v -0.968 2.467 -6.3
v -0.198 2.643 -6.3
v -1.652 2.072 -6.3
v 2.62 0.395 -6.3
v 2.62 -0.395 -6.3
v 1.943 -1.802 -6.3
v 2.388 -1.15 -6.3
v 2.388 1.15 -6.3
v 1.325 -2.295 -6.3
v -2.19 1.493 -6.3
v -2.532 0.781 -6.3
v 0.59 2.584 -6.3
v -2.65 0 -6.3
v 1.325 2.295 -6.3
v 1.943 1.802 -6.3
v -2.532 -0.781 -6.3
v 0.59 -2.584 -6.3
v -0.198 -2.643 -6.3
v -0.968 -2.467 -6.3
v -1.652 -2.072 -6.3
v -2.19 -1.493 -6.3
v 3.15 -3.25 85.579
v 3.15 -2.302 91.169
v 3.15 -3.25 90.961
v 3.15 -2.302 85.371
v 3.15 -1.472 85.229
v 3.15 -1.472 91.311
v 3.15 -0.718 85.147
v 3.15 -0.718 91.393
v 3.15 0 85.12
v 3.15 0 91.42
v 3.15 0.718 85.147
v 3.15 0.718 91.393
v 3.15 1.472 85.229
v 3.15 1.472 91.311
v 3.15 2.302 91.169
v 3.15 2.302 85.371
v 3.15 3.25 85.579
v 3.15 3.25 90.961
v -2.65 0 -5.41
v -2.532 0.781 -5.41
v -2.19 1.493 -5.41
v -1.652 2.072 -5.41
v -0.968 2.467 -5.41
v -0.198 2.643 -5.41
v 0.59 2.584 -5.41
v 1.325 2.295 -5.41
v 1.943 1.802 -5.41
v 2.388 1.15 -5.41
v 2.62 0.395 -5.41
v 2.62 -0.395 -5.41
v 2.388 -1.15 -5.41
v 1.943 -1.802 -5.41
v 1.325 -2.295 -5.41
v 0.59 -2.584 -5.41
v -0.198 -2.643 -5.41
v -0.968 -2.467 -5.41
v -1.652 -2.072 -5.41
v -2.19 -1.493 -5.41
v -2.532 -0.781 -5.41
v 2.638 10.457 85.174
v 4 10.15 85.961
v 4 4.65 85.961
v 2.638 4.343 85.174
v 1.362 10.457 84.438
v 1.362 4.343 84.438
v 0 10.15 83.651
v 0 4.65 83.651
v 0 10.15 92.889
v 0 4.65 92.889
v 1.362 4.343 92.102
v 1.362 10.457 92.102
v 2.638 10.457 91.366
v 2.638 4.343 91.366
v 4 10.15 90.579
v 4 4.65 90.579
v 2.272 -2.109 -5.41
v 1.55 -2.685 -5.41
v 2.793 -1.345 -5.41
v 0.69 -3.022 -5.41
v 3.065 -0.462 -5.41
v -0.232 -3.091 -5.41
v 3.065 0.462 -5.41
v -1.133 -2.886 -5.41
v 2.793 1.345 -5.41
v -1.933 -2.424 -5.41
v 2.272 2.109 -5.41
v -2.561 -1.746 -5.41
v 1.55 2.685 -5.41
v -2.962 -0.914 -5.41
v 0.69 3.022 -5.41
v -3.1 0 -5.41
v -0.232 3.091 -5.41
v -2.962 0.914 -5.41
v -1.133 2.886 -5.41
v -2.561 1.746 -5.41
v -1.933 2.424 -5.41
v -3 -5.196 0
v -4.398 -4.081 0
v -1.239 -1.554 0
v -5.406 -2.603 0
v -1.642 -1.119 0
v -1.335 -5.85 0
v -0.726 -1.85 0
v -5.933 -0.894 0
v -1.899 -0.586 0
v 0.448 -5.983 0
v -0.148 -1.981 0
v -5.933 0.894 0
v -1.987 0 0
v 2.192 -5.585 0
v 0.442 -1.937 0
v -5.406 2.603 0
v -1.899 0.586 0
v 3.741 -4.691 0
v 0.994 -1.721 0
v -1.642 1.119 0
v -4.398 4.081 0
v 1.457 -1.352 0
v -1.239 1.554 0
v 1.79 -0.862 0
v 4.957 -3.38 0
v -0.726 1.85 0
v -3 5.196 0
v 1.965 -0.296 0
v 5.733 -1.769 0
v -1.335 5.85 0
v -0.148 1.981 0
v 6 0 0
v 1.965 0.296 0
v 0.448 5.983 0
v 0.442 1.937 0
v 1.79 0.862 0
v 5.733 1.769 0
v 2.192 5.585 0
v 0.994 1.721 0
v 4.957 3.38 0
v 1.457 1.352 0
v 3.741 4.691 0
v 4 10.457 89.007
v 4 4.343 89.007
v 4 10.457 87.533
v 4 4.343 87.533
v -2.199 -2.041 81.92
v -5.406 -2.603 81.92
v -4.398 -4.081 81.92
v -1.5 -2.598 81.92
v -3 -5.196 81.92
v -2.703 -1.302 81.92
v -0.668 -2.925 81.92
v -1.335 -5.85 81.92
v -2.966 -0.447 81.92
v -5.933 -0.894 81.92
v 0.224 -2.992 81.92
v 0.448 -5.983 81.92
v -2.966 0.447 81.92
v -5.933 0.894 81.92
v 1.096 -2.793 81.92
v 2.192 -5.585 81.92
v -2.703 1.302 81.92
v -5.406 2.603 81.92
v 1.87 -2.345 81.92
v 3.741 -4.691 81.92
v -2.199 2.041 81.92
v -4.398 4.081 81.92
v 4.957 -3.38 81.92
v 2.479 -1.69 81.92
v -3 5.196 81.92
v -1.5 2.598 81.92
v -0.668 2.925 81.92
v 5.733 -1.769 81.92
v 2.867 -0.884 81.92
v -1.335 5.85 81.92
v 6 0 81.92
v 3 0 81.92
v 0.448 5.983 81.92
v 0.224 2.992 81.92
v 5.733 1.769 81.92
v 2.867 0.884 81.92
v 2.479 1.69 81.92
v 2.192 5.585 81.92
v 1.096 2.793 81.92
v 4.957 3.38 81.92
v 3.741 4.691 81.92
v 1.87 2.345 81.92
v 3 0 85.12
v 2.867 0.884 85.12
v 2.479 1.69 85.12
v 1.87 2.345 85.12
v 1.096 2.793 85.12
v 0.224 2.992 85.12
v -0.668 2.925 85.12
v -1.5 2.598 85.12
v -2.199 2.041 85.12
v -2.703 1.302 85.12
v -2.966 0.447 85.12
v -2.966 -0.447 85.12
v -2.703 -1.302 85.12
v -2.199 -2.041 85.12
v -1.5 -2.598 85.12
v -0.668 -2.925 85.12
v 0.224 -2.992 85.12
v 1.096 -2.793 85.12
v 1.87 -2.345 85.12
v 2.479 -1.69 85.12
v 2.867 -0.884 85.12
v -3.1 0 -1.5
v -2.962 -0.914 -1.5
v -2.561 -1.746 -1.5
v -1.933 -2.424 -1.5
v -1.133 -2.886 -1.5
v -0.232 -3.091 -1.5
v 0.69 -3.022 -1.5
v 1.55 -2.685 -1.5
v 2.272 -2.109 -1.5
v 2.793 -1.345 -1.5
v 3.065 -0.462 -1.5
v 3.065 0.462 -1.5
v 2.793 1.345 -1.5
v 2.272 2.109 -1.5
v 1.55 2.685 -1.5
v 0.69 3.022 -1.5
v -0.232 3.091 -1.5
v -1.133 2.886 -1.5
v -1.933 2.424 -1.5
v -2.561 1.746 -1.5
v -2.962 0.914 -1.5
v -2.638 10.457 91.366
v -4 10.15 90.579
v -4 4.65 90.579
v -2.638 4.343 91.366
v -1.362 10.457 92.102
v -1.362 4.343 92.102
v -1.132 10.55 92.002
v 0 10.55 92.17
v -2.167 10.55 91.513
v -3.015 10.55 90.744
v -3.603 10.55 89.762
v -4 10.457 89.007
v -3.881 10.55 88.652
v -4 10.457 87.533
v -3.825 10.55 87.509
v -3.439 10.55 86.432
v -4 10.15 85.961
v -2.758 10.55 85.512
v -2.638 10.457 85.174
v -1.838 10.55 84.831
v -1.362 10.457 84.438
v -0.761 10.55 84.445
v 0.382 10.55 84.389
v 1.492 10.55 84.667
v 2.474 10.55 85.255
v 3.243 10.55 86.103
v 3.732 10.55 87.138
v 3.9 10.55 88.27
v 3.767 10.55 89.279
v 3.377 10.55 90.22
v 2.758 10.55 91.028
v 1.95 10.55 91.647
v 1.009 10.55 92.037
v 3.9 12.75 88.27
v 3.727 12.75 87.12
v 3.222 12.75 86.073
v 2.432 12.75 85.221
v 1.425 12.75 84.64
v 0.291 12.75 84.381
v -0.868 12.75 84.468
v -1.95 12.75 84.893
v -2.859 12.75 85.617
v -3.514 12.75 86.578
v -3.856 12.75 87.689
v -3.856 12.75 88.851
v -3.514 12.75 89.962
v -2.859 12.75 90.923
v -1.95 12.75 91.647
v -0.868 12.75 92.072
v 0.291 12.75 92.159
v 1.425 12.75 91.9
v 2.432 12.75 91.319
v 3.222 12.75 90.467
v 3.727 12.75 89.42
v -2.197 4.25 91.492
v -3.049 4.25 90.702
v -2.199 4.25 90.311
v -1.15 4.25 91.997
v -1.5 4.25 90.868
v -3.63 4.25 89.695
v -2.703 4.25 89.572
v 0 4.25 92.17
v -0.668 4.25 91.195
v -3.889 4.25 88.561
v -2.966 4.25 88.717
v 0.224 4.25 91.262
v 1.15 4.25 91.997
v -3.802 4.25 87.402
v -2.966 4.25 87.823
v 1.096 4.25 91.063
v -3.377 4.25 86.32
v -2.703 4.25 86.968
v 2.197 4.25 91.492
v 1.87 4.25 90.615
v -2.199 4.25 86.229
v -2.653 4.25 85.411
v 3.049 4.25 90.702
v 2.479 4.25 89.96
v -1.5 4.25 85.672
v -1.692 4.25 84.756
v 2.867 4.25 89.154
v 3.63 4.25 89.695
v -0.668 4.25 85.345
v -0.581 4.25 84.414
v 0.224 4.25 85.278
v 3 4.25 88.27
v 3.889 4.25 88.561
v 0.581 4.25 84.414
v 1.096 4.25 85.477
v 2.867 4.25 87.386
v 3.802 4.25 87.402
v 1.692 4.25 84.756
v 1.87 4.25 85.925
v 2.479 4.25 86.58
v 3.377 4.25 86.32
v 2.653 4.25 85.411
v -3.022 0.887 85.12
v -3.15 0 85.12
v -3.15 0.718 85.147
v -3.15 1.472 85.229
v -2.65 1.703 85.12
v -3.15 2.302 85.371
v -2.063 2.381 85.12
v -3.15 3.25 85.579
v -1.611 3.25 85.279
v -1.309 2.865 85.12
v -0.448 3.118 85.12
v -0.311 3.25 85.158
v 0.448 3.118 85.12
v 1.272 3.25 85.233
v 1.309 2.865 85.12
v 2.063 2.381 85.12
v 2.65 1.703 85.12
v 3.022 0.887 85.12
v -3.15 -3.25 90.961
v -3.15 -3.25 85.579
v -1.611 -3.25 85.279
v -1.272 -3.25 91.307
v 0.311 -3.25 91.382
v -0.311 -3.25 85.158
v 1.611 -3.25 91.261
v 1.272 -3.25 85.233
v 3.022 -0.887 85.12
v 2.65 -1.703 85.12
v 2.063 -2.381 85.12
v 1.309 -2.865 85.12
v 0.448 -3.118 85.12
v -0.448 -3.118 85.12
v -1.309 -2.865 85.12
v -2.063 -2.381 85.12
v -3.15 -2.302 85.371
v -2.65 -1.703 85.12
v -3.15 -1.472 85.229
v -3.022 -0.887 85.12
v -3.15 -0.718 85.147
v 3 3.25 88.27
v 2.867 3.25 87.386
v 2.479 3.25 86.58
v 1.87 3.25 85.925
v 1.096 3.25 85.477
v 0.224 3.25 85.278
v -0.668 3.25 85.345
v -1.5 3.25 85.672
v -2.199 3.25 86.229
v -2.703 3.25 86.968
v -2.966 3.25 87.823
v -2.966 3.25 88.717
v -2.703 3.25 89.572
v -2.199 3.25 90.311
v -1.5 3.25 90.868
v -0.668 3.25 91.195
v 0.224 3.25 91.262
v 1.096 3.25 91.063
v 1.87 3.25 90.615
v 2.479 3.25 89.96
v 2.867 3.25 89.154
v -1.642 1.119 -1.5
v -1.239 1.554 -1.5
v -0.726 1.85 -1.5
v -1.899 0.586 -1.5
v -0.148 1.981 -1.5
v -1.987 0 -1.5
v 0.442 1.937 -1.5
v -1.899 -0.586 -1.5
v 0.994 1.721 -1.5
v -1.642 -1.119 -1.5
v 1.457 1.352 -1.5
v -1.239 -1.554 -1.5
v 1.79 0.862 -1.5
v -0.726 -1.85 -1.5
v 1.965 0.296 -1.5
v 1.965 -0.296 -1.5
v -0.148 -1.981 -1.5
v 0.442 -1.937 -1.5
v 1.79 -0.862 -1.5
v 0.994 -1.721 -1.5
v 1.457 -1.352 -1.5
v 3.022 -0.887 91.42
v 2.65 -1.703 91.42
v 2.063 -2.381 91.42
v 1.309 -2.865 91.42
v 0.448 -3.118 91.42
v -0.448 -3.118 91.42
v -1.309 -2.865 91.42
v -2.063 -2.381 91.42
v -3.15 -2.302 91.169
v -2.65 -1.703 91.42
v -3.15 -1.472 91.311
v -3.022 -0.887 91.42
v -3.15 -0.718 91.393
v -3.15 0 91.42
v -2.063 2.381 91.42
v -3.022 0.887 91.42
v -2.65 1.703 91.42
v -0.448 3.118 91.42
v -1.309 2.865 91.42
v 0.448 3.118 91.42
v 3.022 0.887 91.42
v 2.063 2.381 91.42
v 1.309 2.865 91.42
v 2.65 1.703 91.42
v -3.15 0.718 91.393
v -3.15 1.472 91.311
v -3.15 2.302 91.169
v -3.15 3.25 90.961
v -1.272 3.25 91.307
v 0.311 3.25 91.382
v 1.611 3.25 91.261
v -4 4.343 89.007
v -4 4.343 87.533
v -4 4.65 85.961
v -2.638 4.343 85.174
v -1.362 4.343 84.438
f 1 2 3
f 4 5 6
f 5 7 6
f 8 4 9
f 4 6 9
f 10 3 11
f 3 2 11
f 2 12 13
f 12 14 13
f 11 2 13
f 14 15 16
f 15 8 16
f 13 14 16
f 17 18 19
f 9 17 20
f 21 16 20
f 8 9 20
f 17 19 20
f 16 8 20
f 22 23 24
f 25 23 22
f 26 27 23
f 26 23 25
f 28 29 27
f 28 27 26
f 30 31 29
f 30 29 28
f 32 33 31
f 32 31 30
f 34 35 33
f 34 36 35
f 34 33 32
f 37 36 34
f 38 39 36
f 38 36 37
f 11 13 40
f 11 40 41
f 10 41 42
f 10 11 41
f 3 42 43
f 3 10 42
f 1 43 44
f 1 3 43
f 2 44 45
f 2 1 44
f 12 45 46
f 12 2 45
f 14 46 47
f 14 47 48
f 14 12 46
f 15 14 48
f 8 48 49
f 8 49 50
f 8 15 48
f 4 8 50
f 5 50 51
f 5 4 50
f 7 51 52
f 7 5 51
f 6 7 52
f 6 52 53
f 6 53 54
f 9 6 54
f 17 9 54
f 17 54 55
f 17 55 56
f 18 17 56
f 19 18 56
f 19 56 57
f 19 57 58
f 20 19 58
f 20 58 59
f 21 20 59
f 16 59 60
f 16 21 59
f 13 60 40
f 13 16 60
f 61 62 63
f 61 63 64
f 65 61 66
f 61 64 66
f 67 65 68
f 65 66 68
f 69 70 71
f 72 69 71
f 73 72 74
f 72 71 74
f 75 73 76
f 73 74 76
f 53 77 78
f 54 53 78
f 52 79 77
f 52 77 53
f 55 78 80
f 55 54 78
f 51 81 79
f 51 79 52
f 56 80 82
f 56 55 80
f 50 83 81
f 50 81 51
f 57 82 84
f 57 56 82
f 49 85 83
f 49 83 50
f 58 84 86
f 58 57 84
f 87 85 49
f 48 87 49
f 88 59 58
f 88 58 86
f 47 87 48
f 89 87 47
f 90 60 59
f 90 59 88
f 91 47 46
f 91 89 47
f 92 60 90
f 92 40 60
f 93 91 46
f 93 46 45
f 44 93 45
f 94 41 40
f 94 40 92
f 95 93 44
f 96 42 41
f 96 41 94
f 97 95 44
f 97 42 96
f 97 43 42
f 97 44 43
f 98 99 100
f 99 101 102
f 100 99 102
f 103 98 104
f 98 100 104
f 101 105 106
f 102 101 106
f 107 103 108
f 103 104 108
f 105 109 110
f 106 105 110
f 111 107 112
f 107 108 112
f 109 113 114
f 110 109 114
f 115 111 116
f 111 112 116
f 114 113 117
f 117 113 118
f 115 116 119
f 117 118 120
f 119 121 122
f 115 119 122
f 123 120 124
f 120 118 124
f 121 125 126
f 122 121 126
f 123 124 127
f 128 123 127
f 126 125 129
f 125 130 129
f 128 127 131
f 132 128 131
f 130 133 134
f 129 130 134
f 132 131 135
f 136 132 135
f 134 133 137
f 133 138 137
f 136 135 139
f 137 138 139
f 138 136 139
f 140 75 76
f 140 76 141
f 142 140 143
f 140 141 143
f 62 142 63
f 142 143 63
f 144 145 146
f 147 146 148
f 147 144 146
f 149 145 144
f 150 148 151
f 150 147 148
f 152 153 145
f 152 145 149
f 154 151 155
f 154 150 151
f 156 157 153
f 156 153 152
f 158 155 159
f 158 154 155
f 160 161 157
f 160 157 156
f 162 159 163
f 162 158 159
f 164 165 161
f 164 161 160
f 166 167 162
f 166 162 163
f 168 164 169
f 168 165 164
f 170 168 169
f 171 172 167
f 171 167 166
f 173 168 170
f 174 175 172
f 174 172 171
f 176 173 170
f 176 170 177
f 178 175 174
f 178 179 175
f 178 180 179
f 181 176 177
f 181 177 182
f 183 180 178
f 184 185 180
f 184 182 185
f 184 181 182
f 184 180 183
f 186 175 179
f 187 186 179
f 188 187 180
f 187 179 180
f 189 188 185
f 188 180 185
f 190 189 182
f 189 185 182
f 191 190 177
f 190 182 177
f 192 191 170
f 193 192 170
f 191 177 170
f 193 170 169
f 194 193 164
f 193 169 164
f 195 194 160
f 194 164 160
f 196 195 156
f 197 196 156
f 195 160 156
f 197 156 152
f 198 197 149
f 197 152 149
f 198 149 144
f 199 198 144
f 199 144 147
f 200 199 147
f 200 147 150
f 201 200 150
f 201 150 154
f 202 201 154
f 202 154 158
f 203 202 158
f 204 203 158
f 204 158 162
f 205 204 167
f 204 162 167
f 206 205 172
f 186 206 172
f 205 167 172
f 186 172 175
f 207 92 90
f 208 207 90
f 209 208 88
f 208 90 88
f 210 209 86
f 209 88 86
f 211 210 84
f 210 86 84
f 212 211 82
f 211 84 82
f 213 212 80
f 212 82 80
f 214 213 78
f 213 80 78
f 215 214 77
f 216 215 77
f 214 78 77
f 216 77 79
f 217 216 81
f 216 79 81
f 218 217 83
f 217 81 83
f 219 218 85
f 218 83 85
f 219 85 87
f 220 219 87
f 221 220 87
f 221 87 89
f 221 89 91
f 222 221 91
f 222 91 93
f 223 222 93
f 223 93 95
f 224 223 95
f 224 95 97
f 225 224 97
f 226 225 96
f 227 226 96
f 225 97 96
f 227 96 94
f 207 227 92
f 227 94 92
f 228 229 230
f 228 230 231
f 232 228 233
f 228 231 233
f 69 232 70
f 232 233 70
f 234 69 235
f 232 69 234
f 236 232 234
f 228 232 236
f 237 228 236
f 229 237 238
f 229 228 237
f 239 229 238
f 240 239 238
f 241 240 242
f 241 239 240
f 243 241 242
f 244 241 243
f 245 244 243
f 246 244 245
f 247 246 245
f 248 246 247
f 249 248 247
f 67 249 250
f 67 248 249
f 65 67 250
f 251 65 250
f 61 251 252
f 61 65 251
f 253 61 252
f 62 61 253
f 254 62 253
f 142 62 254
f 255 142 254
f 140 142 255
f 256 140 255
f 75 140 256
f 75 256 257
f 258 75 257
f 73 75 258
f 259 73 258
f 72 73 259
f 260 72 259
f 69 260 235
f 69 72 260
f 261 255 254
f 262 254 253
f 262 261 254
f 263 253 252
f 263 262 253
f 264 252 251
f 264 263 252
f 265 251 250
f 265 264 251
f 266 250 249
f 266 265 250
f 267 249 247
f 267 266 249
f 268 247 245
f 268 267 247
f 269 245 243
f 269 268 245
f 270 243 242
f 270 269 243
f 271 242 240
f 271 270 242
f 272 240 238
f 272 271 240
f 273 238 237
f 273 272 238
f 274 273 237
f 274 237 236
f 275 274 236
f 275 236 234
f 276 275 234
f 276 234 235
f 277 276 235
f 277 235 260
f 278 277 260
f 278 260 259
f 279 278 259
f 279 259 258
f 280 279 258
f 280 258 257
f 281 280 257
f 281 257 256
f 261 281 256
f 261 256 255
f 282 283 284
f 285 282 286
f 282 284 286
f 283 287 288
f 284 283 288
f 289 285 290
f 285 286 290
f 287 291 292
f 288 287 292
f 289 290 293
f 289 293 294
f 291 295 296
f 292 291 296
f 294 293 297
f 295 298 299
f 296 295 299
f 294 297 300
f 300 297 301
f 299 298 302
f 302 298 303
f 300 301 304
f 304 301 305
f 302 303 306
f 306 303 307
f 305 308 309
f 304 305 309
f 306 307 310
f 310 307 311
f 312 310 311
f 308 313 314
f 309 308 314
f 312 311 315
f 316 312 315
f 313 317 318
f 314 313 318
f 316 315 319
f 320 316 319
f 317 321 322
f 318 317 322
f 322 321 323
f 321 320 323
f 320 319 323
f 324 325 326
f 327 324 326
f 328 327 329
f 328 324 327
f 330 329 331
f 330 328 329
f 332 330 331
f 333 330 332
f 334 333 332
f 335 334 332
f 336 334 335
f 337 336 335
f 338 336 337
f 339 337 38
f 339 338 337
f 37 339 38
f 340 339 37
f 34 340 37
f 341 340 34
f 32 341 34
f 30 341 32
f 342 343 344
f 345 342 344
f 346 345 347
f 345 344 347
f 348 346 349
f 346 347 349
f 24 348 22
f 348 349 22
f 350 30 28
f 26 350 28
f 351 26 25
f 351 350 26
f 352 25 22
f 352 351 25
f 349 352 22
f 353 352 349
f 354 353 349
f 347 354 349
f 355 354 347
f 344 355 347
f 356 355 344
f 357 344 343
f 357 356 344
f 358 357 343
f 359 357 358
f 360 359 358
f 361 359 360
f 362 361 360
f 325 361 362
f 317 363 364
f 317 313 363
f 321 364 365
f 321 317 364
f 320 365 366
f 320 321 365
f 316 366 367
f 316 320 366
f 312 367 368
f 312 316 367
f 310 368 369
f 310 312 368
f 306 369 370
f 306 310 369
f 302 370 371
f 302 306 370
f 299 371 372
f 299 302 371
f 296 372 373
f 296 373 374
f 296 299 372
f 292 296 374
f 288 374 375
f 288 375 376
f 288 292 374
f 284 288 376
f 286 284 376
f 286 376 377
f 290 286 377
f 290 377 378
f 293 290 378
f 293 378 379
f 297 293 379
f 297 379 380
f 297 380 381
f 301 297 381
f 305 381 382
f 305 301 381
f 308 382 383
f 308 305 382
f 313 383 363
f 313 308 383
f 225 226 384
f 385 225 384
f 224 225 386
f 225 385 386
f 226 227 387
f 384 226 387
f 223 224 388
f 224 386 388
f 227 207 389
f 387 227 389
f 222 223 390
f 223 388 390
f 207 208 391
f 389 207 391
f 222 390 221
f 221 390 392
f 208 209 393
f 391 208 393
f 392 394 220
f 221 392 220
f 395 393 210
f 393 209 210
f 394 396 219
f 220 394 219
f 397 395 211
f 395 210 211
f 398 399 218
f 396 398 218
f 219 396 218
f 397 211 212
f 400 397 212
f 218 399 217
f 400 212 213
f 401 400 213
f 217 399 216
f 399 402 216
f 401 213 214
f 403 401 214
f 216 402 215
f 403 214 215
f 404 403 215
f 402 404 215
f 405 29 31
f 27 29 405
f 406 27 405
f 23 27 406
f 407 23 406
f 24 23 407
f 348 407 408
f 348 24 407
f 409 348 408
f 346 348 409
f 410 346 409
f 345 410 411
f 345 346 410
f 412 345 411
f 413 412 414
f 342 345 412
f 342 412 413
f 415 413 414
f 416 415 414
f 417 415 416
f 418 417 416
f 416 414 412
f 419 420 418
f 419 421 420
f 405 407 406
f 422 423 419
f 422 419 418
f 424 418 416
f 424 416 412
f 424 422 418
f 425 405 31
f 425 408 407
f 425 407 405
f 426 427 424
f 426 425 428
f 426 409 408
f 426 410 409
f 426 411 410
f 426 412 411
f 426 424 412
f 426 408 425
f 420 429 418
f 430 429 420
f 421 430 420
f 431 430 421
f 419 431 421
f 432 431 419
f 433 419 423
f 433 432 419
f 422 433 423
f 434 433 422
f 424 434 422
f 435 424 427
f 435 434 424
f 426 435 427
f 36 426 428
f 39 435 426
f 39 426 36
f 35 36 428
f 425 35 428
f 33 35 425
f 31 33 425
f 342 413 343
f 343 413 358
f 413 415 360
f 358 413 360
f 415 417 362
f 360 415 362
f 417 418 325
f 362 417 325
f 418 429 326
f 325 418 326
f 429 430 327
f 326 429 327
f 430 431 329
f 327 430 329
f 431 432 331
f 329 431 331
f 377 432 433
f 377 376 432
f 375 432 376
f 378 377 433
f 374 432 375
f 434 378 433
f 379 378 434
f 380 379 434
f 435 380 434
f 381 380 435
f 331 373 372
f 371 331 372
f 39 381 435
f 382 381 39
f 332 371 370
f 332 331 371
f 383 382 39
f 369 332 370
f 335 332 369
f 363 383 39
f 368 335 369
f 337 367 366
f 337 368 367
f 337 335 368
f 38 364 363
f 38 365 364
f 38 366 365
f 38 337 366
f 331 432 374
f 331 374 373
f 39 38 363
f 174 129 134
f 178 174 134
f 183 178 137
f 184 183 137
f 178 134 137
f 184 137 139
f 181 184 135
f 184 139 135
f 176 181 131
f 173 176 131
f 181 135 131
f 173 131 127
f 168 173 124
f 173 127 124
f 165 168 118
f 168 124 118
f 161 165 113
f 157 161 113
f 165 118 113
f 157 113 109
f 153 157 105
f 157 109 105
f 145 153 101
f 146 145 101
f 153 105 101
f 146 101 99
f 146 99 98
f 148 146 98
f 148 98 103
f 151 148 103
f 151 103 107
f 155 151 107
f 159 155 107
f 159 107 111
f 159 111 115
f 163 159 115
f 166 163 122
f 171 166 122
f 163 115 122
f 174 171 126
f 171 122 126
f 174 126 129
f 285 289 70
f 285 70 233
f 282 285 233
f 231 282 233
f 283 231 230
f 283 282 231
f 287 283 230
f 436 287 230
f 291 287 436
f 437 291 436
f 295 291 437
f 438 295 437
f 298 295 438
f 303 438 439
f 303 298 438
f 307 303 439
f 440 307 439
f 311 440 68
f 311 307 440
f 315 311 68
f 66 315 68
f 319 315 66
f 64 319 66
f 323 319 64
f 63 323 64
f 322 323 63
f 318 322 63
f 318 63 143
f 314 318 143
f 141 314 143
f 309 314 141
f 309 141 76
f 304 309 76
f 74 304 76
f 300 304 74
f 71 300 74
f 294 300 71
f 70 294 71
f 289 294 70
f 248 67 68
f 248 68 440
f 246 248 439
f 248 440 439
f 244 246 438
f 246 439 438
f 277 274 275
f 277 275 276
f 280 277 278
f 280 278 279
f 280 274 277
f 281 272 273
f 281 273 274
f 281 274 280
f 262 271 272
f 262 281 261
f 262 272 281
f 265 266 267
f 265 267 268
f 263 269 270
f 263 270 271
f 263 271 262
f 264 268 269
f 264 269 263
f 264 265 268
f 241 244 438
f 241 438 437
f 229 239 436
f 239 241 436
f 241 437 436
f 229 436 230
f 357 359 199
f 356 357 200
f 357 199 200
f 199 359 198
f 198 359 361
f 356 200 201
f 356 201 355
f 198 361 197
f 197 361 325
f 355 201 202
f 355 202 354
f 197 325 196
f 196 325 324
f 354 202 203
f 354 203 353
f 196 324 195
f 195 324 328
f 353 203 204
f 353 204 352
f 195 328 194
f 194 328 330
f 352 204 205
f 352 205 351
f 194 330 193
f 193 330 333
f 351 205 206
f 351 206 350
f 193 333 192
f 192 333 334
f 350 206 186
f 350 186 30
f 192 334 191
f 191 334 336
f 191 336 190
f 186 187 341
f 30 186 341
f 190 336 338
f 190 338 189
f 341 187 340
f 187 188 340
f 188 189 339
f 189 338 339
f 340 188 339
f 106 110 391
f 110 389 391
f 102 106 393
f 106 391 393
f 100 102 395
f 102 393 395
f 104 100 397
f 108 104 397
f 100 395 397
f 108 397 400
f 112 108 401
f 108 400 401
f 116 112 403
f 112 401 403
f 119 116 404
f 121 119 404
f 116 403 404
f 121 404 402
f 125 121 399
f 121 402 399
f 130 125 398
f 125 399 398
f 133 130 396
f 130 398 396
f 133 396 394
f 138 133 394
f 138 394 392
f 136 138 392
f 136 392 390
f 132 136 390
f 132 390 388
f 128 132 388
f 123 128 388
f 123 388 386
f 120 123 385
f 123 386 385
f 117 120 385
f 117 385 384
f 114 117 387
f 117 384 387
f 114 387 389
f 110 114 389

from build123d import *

# Parameters (mm, degrees)
SKETCH1_R           = 6
BOSS_EXTRUDE1_DEPTH = 81.92
SKETCH3_R           = 3
BOSS_EXTRUDE2_DEPTH = 3.2
SKETCH4_W           = 6.3
SKETCH4_H           = 6.3
BOSS_EXTRUDE3_DEPTH = 3.25
SKETCH10_R          = 3
BOSS_EXTRUDE6_DEPTH = 1
BOSS_EXTRUDE7_DEPTH = 8.5
SKETCH12_R          = 5.645731703
SKETCH12_R_2        = 3.9
CUT_EXTRUDE2_DEPTH  = 2.2
SKETCH14_R          = 3.959834879
SKETCH14_R_2        = 2.65
CUT_EXTRUDE3_DEPTH  = 0.89


with BuildPart() as part:
    # Sketch1 → Boss-Extrude1 (new body)
    with BuildSketch(Plane.XY):
        Circle(SKETCH1_R)
    extrude(amount=BOSS_EXTRUDE1_DEPTH)

    # Sketch2 → Revolve1 (revolve)
    with BuildSketch(Plane(origin=(0, 0, 0), x_dir=(1, 0, 0), z_dir=(0, 1, 0))):
        Polygon((-1.987053294, 0), (-1.987053294, 1.5), (-3.1, 1.5), (-3.1, 6.3), (0, 6.3), (0, 0), align=None)
    revolve(axis=Axis((0, 0, 88.862708705), (0, 0, 1)))

    # Sketch3 → Boss-Extrude2 (add)
    with BuildSketch(Plane.XY.offset(81.92)):
        Circle(SKETCH3_R)
    extrude(amount=BOSS_EXTRUDE2_DEPTH)

    # Sketch4 → Boss-Extrude3 (add, symmetric)
    with BuildSketch(Plane(origin=(0, 0, 0), x_dir=(1, 0, 0), z_dir=(0, 1, 0))):
        with Locations((0, -88.27)):
            Rectangle(SKETCH4_W, SKETCH4_H)
    extrude(amount=BOSS_EXTRUDE3_DEPTH, both=True)

    # Sketch9 → Cut-Revolve3 (revolve, cut)
    with BuildSketch(Plane(origin=(0, 0, 0), x_dir=(1, 0, 0), z_dir=(0, 1, 0))):
        Polygon((-3.15, -91.42), (-4.65, -90.92), (-4.65, -91.42), align=None)
        Polygon((-3.15, -85.12), (-4.65, -85.12), (-4.65, -85.62), align=None)
    revolve(axis=Axis((0, 0, 97.04036036), (0, 0, -1)), mode=Mode.SUBTRACT)

    # Sketch10 → Boss-Extrude6 (add, symmetric)
    with BuildSketch(Plane(origin=(0, 3.25, 0), x_dir=(1, 0, 0), z_dir=(0, 1, 0))):
        with Locations((0, -88.27)):
            Circle(SKETCH10_R)
    extrude(amount=BOSS_EXTRUDE6_DEPTH, both=True)

    # Sketch11 → Boss-Extrude7 (add)
    with BuildSketch(Plane(origin=(0, 4.25, 0), x_dir=(1, 0, 0), z_dir=(0, 1, 0))):
        Polygon((0, -83.651197846), (-4, -85.960598923), (-4, -90.579401077), (0, -92.888802154), (4, -90.579401077), (4, -85.960598923), align=None)
    extrude(amount=BOSS_EXTRUDE7_DEPTH)

    # Sketch12 → Cut-Extrude2 (cut)
    with BuildSketch(Plane(origin=(0, 12.75, 0), x_dir=(1, 0, 0), z_dir=(0, 1, 0))):
        with Locations((0, -88.27)):
            Circle(SKETCH12_R)
        with Locations((0, -88.27)):
            Circle(SKETCH12_R_2, mode=Mode.SUBTRACT)
    extrude(amount=-CUT_EXTRUDE2_DEPTH, mode=Mode.SUBTRACT)

    # Sketch13 → Cut-Revolve4 (revolve, cut)
    with BuildSketch(Plane(origin=(0, 0, 0), x_dir=(0, 0, -1), z_dir=(1, 0, 0))):
        Polygon((-92.17, 10.55), (-92.888802154, 10.15), (-92.888802154, 10.55), align=None)
        Polygon((-92.888802154, 4.65), (-92.17, 4.25), (-92.888802154, 4.25), align=None)
    revolve(axis=Axis((0, 13.752185795, 88.27), (0, -1, 0)), mode=Mode.SUBTRACT)

    # Sketch14 → Cut-Extrude3 (cut)
    with BuildSketch(Plane(origin=(0, 0, -6.3), x_dir=(-1, 0, 0), z_dir=(0, 0, -1))):
        Circle(SKETCH14_R)
        Circle(SKETCH14_R_2, mode=Mode.SUBTRACT)
    extrude(amount=-CUT_EXTRUDE3_DEPTH, mode=Mode.SUBTRACT)


solid = part.part
